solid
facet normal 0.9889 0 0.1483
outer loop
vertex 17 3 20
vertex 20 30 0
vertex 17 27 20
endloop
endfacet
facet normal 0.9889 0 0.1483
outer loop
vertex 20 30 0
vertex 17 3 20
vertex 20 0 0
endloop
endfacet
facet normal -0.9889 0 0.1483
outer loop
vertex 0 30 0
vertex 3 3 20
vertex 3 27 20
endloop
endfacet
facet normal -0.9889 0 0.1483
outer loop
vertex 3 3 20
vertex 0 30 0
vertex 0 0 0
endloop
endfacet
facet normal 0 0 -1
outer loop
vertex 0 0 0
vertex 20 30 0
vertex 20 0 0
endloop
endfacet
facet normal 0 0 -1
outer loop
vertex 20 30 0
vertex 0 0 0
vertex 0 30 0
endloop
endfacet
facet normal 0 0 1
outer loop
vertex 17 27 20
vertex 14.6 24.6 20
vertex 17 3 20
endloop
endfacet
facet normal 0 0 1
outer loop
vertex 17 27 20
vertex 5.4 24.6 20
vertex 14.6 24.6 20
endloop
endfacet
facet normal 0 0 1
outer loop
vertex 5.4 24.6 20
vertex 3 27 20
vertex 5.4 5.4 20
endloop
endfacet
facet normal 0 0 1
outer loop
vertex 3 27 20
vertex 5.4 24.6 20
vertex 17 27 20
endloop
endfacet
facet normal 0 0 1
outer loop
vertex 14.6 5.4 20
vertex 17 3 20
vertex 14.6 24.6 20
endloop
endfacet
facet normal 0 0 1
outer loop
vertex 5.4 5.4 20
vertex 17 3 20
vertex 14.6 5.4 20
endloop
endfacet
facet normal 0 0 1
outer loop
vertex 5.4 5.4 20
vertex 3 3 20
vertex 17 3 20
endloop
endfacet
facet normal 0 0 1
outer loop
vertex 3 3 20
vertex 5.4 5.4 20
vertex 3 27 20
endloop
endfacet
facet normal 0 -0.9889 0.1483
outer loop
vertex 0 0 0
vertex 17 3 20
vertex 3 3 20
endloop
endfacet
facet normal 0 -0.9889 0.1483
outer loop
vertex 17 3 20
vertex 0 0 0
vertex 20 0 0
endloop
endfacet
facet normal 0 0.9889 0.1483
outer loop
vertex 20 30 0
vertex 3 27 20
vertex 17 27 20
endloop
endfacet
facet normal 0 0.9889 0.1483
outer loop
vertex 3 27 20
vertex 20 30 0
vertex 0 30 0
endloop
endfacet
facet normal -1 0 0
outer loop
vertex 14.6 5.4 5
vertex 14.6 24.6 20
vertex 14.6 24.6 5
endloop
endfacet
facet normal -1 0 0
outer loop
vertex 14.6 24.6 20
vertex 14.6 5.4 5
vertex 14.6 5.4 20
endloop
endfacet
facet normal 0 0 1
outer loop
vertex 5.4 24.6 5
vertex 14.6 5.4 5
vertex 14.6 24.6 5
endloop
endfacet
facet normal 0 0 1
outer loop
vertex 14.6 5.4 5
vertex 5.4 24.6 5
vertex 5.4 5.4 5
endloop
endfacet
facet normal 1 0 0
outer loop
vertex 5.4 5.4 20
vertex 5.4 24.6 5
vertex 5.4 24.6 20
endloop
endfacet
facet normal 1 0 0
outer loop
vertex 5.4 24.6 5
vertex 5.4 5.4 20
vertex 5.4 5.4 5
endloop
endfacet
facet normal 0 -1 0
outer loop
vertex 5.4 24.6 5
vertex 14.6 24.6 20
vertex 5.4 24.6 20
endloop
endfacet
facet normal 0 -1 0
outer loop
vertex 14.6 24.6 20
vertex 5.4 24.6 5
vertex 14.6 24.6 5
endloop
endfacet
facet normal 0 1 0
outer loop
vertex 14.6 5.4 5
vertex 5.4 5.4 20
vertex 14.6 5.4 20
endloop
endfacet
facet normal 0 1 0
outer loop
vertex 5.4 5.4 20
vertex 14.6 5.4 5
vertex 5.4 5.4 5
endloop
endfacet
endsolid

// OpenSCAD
// https://www.calculator.net/right-triangle-calculator.html
angle=30;
height = 120;
length = 207.8; 
width = 200;   
thick_1 = 10;
thick_2 = 20;

// leg settings
leg_offs_x1 = 5; // bottom offset
leg_offs_x2 = 3; // top offset

module upper_shape() {
    //the top section
    difference(){
        polygon([[0,0], [0, height], [length,0]]);
            translate([0, -thick_1])
        polygon([[0,0], [0, height], [length,0]]);
    }
    
    //the side section (start at 5 mm from origin)
    translate([0,5])
    square([thick_1,height-thick_1-5]);
    
    //the front stopper
    translate([length,0])
    rotate([0,0,-angle])
    translate([-thick_1,0])
    union(){
        translate([0,thick_1])
            corner_shape(type=0, r=thick_1);
        square([thick_1,thick_1]);
    }
    
    //a filler close to the front stopper
    h = thick_1-3;
    translate([length-thick_2,0,0])
    polygon([[0,h], [thick_1,0], [thick_2,h]]);
    
 
}

module upper_part(){
    linear_extrude(height=thick_2)
        upper_shape();
}

module corner_shape(type, r){
    if (type == 0){
        intersection(){
            square([r,r]);
            circle(r=r, $fn=50);    
        }
    }
    if (type == 1){
        difference(){
            square([r,r]);
            translate([r,r])
            circle(r=r,$fn=50);                
        }
    }
}


module leg_part(){
    
    y = thick_2; // the 2d height
    x1 = thick_1 + 2* leg_offs_x1; // 2d total len for thinner shape   
    x2 = thick_2 + 2* leg_offs_x1; // 2d total len for thicker shape
    
    difference(){
        translate([0,x2,0])
        rotate([90,0,0])
        intersection(){
            //the thinner piece
            linear_extrude(height=x2)
            polygon([[0,0],[leg_offs_x2,y], [x1-leg_offs_x2,y], [x1,0]]);

            //the thicker piece
            translate([0,0,x2])
            rotate([0,90,0])
            linear_extrude(height=x1)
            polygon([[0,0],[leg_offs_x2,y], [x2-leg_offs_x2,y], [x2,0]]);
        }

        //the cutout
        spacer = 0.4;    
        translate([leg_offs_x1+spacer,leg_offs_x1+spacer,5])
        cube([thick_1-2*spacer, thick_2-2*spacer,thick_2]);
    }
}

module lower_part(){
    leg_width=thick_2+2*leg_offs_x1;
    

    leg_part();
    
    translate([0,width-leg_width,0])
    leg_part();
    
    translate([leg_offs_x1, leg_width-leg_offs_x2, 0])
    cube([thick_1, width - 2* (leg_width - leg_offs_x2), thick_2]);
    
}

leg_part();
//upper_shape();
//rounding(type=1, r=20);
//upper_part();
//lower_part();
